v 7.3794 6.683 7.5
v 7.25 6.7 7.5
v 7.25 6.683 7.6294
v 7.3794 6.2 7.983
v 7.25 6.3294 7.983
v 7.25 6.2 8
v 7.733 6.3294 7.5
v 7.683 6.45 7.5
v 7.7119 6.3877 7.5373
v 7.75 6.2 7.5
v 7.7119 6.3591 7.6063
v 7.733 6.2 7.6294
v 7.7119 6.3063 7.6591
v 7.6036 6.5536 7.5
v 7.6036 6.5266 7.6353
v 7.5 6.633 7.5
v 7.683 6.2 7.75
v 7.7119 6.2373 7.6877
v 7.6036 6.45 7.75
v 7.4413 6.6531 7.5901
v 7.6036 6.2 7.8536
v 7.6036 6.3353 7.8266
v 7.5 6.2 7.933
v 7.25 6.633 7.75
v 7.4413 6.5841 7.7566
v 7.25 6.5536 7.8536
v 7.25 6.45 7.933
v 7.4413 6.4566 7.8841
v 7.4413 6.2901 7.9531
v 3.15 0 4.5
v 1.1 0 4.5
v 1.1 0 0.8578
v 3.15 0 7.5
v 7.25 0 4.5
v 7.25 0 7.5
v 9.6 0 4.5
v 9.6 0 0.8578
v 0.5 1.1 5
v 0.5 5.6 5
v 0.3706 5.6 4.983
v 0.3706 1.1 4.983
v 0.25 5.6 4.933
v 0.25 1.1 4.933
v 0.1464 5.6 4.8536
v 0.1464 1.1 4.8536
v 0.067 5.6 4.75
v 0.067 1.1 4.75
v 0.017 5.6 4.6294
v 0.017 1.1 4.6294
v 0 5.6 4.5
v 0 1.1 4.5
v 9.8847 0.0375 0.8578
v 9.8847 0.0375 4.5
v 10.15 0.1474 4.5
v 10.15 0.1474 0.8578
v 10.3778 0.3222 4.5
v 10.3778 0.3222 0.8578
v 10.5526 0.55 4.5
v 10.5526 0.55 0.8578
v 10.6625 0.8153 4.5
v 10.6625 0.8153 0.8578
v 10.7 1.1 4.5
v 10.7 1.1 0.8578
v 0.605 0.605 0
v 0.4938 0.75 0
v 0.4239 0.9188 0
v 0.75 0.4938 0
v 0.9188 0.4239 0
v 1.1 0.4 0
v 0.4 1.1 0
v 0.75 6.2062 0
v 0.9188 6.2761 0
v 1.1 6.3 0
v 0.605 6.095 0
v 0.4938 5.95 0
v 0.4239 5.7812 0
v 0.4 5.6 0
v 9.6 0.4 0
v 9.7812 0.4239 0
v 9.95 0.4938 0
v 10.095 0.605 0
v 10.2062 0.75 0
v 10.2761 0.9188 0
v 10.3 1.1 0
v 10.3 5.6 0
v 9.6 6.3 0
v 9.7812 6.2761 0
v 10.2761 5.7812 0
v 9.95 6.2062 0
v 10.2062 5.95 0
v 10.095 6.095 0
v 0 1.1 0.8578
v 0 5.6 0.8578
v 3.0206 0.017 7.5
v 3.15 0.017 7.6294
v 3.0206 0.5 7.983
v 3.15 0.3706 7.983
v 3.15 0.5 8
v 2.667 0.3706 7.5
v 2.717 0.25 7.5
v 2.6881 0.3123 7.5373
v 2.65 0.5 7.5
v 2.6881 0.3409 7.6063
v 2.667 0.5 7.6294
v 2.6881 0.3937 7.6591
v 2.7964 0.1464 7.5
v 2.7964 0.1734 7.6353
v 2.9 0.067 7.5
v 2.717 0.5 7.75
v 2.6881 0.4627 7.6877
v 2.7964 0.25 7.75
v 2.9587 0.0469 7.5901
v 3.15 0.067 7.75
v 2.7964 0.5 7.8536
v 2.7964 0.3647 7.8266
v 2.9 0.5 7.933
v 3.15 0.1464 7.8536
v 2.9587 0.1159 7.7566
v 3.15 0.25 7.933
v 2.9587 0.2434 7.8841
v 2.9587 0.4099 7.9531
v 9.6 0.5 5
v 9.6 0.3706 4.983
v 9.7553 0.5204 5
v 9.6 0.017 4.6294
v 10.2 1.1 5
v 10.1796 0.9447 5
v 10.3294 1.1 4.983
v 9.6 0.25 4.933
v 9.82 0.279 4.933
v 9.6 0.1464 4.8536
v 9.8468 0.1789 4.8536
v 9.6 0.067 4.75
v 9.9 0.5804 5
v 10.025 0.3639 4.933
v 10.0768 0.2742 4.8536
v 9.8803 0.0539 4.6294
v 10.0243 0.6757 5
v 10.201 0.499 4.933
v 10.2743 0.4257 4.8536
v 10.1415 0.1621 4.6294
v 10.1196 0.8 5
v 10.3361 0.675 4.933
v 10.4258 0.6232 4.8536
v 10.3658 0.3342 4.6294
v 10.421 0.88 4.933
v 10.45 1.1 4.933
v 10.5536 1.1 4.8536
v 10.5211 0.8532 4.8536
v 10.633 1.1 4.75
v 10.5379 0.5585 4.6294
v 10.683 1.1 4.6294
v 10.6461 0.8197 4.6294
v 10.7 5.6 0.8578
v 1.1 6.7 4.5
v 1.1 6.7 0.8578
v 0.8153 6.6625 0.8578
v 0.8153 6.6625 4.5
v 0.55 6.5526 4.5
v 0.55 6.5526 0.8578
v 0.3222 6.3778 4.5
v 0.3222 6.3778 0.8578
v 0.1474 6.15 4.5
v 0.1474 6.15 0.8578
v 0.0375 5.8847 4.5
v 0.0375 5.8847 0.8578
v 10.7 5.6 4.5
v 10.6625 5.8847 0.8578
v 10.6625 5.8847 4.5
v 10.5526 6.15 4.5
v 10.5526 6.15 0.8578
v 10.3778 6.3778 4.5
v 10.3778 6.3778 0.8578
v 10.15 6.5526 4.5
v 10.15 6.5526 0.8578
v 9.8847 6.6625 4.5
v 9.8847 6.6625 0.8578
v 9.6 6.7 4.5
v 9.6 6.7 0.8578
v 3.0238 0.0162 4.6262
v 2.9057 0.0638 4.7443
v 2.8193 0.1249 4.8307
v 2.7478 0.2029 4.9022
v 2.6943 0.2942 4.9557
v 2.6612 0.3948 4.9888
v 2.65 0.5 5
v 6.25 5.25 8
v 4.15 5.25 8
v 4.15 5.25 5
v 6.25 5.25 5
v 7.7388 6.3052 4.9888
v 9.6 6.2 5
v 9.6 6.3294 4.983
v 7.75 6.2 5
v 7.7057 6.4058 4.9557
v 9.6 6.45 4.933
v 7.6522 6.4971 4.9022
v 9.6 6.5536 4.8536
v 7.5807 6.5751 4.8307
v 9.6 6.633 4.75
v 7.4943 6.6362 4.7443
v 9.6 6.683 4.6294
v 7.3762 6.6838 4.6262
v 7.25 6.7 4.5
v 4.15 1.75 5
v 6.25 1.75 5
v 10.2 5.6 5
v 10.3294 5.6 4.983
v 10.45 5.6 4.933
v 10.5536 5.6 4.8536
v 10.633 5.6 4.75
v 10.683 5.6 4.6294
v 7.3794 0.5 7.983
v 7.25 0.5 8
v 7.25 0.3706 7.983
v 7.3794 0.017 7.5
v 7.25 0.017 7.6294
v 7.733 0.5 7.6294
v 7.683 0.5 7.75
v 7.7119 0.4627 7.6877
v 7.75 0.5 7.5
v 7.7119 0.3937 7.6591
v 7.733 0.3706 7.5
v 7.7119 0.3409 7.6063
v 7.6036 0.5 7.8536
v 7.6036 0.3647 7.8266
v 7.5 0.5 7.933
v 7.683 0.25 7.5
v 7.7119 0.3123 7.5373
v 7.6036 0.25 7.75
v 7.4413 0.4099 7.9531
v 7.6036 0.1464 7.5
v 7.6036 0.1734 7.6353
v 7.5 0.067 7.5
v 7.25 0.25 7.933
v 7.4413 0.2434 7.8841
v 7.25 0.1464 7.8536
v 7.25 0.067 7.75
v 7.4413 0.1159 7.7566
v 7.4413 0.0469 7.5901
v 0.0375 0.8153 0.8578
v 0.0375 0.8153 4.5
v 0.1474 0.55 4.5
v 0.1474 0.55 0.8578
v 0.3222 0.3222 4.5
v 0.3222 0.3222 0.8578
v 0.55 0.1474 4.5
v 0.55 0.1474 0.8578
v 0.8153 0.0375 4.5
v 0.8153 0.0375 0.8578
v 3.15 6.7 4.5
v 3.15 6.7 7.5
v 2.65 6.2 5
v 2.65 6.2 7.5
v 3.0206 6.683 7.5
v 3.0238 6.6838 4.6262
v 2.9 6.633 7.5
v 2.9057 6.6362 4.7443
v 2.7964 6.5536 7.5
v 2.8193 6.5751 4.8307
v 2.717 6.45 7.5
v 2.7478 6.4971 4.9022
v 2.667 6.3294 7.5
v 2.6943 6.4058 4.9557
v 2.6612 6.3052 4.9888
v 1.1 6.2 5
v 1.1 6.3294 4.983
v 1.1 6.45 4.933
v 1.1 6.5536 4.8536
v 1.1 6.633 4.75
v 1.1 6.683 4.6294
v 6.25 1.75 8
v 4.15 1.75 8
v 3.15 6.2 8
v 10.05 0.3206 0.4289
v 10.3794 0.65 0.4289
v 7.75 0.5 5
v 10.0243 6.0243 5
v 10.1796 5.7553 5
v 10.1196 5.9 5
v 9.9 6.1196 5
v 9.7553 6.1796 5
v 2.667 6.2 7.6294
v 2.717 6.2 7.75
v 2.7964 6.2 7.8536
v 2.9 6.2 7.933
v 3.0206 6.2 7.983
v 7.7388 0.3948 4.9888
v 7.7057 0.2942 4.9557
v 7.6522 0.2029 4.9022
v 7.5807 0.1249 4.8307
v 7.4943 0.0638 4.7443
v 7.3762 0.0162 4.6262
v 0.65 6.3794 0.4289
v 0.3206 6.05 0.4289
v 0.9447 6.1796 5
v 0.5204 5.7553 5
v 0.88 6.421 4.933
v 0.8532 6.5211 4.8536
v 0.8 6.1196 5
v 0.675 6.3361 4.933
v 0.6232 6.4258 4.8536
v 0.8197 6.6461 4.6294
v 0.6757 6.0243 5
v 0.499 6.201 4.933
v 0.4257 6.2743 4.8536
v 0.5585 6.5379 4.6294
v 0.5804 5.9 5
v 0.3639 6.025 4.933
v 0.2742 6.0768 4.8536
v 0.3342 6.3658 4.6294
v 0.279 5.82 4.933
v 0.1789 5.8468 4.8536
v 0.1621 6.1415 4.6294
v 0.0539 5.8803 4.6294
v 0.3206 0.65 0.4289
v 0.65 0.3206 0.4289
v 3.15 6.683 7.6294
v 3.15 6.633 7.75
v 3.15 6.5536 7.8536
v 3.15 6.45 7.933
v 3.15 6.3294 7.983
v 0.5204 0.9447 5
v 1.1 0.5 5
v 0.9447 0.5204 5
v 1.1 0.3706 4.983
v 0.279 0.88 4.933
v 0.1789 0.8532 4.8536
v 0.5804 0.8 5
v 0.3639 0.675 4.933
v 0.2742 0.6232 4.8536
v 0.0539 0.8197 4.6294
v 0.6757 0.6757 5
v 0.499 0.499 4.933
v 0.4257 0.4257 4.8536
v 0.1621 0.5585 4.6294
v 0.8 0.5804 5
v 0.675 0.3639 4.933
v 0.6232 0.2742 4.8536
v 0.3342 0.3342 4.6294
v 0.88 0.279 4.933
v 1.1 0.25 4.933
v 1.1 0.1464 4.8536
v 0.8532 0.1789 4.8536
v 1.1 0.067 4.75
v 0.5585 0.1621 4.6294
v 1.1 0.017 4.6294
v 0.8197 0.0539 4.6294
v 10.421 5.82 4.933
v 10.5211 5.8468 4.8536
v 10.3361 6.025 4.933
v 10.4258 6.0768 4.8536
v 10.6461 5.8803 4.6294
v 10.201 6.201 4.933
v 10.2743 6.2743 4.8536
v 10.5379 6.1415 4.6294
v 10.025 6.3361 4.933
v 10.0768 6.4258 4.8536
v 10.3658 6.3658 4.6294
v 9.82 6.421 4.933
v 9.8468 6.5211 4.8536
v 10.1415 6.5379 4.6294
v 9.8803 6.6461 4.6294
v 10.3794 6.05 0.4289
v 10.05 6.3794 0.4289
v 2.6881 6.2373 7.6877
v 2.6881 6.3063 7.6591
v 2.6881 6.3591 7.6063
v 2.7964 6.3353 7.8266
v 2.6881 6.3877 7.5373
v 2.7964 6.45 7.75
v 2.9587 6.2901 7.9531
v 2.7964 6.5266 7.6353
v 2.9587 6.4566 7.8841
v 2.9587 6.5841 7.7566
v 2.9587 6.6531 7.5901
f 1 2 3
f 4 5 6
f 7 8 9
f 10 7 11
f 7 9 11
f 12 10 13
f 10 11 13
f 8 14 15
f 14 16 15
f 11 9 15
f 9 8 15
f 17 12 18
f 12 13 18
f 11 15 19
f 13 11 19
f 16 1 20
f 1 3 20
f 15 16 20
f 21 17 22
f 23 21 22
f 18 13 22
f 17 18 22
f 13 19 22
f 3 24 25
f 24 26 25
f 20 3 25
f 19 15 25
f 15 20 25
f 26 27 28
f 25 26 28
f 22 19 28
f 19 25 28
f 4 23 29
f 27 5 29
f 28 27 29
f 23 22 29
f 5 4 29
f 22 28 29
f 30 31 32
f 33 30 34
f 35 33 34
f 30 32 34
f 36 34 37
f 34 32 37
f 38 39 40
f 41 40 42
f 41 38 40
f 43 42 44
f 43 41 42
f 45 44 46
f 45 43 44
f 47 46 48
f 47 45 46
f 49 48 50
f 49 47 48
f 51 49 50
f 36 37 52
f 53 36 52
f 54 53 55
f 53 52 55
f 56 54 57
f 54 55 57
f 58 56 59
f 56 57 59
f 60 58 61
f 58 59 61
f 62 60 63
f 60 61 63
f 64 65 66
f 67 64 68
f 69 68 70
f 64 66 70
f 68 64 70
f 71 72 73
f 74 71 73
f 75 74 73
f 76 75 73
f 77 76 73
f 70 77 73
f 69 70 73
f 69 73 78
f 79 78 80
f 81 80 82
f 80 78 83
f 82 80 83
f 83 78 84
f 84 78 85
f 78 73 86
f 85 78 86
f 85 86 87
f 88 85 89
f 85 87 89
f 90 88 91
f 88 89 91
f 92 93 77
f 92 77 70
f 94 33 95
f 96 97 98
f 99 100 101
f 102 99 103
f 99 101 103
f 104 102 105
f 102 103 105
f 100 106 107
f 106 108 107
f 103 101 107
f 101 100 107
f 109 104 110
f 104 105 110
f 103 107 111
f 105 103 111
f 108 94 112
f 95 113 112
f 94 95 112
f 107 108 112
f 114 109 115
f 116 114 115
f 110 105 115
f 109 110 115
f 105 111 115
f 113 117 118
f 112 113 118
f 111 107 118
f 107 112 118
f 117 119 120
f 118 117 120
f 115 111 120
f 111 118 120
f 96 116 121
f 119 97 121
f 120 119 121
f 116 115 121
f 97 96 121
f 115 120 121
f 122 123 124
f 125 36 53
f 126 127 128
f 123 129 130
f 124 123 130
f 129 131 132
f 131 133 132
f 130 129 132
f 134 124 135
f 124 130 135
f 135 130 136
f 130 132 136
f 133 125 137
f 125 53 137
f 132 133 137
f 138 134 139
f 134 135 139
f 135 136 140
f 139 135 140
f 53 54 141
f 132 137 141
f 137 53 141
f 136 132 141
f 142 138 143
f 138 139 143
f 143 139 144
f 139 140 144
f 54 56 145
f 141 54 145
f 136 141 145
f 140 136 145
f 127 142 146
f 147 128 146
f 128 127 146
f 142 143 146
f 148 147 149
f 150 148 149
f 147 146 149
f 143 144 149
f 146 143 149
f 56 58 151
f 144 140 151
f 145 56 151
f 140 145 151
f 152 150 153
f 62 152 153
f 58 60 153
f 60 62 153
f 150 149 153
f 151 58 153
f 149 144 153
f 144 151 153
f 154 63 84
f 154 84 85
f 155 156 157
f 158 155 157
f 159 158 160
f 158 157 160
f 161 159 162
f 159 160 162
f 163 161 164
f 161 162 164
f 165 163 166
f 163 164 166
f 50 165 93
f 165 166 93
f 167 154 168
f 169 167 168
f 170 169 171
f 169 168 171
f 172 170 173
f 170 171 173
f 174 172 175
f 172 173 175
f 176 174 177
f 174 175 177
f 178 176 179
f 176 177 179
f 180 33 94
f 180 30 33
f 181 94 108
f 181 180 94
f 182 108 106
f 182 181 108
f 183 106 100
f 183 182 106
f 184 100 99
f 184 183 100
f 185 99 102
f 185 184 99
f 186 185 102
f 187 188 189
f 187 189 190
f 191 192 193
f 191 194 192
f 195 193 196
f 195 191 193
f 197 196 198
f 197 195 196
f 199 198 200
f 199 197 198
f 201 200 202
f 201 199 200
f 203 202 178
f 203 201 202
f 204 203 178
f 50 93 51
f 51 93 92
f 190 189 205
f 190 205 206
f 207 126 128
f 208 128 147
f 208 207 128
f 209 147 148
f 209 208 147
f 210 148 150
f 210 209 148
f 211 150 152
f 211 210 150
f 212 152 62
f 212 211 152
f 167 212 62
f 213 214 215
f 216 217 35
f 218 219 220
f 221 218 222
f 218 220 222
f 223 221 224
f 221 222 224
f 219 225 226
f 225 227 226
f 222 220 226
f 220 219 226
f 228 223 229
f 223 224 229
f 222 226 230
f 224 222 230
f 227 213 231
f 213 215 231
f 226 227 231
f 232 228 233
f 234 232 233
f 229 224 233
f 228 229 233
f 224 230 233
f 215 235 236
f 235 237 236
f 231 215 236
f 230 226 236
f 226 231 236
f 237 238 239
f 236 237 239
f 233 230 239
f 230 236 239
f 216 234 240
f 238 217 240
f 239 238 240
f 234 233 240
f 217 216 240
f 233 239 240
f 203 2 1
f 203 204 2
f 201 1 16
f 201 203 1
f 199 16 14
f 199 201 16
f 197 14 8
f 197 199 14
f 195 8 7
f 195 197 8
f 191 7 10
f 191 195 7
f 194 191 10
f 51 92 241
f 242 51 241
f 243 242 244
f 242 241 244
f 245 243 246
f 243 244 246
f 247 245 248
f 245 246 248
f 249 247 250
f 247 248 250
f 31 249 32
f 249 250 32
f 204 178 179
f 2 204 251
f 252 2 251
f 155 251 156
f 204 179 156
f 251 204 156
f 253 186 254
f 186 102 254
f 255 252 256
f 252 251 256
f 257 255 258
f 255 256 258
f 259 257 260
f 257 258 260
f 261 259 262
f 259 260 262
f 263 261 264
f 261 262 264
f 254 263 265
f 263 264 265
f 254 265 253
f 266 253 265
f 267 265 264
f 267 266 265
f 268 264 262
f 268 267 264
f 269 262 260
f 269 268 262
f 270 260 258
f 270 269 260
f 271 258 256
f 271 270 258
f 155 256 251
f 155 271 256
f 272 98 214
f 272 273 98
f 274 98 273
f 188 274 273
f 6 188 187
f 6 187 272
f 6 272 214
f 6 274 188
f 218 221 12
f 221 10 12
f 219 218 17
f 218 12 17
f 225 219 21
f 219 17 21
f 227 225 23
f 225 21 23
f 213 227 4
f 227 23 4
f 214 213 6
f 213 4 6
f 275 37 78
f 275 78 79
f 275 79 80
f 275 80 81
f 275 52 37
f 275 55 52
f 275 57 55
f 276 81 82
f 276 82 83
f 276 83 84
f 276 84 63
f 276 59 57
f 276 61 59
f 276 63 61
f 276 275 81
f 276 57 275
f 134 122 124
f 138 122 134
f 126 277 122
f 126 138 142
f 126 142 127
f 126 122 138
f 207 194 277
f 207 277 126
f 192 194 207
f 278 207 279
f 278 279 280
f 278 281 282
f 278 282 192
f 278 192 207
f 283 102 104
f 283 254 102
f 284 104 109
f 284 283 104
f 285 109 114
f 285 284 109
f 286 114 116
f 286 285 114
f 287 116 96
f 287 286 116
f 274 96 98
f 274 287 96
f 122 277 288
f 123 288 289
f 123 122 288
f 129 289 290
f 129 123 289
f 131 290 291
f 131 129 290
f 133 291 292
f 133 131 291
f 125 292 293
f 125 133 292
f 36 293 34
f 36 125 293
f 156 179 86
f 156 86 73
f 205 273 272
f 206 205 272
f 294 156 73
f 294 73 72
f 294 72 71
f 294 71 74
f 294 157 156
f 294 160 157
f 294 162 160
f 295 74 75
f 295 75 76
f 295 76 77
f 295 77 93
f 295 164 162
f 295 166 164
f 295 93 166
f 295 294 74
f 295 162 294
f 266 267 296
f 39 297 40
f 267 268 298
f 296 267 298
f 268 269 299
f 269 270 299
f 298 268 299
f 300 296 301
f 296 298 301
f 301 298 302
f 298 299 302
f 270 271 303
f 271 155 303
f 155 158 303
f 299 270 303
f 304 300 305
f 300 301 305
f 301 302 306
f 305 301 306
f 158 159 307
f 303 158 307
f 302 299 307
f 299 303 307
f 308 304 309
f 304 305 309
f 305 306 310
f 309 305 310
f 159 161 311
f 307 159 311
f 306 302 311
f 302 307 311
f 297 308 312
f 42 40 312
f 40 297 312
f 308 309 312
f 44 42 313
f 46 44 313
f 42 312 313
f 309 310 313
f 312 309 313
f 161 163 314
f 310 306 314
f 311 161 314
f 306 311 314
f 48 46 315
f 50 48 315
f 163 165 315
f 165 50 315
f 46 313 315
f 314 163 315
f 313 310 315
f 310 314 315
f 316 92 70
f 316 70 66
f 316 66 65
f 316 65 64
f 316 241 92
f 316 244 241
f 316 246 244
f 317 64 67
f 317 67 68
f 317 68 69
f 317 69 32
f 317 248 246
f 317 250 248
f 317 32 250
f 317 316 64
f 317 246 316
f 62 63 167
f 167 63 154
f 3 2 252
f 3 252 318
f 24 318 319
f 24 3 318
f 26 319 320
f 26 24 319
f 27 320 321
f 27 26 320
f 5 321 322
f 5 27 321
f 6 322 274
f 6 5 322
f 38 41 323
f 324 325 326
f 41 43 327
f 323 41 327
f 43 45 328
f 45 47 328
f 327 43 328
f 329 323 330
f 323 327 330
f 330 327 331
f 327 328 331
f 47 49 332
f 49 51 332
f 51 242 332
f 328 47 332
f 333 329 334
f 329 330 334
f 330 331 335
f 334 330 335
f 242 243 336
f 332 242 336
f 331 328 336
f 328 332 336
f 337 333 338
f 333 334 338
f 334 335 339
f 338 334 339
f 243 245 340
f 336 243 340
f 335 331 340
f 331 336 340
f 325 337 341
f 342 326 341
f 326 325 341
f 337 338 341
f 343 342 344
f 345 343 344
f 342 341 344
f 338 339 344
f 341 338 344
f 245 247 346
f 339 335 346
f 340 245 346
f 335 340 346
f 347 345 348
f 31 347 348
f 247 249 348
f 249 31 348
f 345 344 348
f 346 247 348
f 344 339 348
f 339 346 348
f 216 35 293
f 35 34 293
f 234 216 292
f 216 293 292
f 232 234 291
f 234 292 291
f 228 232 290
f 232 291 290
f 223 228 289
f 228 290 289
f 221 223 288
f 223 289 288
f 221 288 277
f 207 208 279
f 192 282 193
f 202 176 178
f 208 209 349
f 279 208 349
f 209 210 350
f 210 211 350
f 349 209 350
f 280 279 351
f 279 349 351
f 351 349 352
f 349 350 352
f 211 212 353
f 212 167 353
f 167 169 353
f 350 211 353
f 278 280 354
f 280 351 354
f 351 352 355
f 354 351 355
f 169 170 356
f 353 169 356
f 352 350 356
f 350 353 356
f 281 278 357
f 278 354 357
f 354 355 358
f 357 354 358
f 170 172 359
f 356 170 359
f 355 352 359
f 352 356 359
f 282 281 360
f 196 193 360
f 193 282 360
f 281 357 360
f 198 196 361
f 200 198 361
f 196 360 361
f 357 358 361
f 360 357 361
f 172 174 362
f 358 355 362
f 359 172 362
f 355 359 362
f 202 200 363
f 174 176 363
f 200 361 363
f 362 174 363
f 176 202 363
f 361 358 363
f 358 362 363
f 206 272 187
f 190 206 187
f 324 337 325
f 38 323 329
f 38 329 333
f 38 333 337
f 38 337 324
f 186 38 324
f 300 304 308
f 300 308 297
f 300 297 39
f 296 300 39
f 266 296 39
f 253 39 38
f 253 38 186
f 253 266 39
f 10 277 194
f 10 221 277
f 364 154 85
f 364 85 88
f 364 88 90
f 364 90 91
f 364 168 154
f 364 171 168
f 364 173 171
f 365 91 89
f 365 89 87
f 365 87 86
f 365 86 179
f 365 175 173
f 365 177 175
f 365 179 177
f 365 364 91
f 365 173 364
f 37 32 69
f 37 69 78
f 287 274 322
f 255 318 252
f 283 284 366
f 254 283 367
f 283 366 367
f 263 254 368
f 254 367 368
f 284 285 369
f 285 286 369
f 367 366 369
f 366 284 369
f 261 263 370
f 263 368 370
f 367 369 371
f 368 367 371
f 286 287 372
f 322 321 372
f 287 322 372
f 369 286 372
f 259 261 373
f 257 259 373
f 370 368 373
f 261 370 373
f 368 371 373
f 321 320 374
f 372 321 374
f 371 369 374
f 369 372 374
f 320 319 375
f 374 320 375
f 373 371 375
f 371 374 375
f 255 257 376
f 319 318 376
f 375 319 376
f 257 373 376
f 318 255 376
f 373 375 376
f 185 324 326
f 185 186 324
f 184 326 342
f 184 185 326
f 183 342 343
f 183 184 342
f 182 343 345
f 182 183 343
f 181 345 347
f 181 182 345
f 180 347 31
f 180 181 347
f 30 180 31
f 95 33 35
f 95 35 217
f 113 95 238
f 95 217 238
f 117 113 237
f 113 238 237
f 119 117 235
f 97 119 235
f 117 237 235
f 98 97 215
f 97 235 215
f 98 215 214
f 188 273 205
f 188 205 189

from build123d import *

# Parameters (mm, degrees)
BOSS_EXTRU_1_DEPTH      = 8
ESQUISSE3_W             = 2.1
ESQUISSE3_H             = 3.5
ENL_V_MAT_EXTRU_1_DEPTH = 3
ESQUISSE4_OUTSIDE_W     = 15.69
ESQUISSE4_OUTSIDE_H     = 11.69
ESQUISSE4_OUTSIDE_W_2   = 5.1
ESQUISSE4_OUTSIDE_H_2   = 6.7
ENL_V_MAT_EXTRU_2_DEPTH = 3
CONG_1_R                = 0.5
CHANFREIN1_SIZE         = 0.4
CHANFREIN1_SIZE2        = 0.857802768


with BuildPart() as part:
    # Esquisse2 → Boss.-Extru.1 (new body)
    with BuildSketch(Plane.XY):
        with BuildLine():
            Line((1.1, 0), (9.6, 0))
            ThreePointArc((9.6, 0), (10.377817459, 0.322182541), (10.7, 1.1))
            Line((10.7, 1.1), (10.7, 5.6))
            ThreePointArc((10.7, 5.6), (10.377817459, 6.377817459), (9.6, 6.7))
            Line((9.6, 6.7), (1.1, 6.7))
            ThreePointArc((1.1, 6.7), (0.322182541, 6.377817459), (0, 5.6))
            Line((0, 5.6), (0, 1.1))
            ThreePointArc((0, 1.1), (0.322182541, 0.322182541), (1.1, 0))
        make_face()
    extrude(amount=BOSS_EXTRU_1_DEPTH)

    # Esquisse3 → Enlèv. mat.-Extru.1 (cut)
    with BuildSketch(Plane.XY.offset(8)):
        with Locations((5.2, 3.5)):
            Rectangle(ESQUISSE3_W, ESQUISSE3_H)
    extrude(amount=-ENL_V_MAT_EXTRU_1_DEPTH, mode=Mode.SUBTRACT)

    # Esquisse4 outside → Enlèv. mat.-Extru.2 (cut)
    with BuildSketch(Plane.XY.offset(8)):
        with Locations((5.35, 3.35)):
            Rectangle(ESQUISSE4_OUTSIDE_W, ESQUISSE4_OUTSIDE_H)
        with Locations((5.2, 3.35)):
            Rectangle(ESQUISSE4_OUTSIDE_W_2, ESQUISSE4_OUTSIDE_H_2, mode=Mode.SUBTRACT)
    extrude(amount=-ENL_V_MAT_EXTRU_2_DEPTH, mode=Mode.SUBTRACT)

    # Congé1
    cong_1_edges = [part.edges().sort_by_distance(p)[0] for p in [
        (5.2, 6.7, 8),
        (5.2, 0, 8),
        (10.7, 3.35, 5),
        (1.875, 6.7, 5),
        (0.322182541, 6.377817459, 5),
        (0, 3.35, 5),
        (0.322182541, 0.322182541, 5),
        (1.875, 0, 5),
        (8.675, 0, 5),
        (10.377817459, 0.322182541, 5),
        (10.377817459, 6.377817459, 5),
        (8.675, 6.7, 5),
        (7.75, 6.7, 6.5),
        (7.75, 3.35, 8),
        (7.75, 0, 6.5),
        (2.65, 0, 6.5),
        (2.65, 3.35, 8),
        (2.65, 6.7, 6.5),
    ]]
    fillet(cong_1_edges, radius=CONG_1_R)

    # Chanfrein1
    chanfrein1_edges = [part.edges().sort_by_distance(p)[0] for p in [
        (5.35, 6.7, 0),
        (10.377817459, 6.377817459, 0),
        (10.7, 3.35, 0),
        (10.377817459, 0.322182541, 0),
        (5.35, 0, 0),
        (0.322182541, 0.322182541, 0),
        (0, 3.35, 0),
        (0.322182541, 6.377817459, 0),
    ]]
    chanfrein1_side = [part.faces().sort_by_distance(p)[0] for p in [
        (5.35, 3.35, 0),
    ]]
    chamfer(chanfrein1_edges, length=CHANFREIN1_SIZE, length2=CHANFREIN1_SIZE2, reference=chanfrein1_side[0])


solid = part.part
